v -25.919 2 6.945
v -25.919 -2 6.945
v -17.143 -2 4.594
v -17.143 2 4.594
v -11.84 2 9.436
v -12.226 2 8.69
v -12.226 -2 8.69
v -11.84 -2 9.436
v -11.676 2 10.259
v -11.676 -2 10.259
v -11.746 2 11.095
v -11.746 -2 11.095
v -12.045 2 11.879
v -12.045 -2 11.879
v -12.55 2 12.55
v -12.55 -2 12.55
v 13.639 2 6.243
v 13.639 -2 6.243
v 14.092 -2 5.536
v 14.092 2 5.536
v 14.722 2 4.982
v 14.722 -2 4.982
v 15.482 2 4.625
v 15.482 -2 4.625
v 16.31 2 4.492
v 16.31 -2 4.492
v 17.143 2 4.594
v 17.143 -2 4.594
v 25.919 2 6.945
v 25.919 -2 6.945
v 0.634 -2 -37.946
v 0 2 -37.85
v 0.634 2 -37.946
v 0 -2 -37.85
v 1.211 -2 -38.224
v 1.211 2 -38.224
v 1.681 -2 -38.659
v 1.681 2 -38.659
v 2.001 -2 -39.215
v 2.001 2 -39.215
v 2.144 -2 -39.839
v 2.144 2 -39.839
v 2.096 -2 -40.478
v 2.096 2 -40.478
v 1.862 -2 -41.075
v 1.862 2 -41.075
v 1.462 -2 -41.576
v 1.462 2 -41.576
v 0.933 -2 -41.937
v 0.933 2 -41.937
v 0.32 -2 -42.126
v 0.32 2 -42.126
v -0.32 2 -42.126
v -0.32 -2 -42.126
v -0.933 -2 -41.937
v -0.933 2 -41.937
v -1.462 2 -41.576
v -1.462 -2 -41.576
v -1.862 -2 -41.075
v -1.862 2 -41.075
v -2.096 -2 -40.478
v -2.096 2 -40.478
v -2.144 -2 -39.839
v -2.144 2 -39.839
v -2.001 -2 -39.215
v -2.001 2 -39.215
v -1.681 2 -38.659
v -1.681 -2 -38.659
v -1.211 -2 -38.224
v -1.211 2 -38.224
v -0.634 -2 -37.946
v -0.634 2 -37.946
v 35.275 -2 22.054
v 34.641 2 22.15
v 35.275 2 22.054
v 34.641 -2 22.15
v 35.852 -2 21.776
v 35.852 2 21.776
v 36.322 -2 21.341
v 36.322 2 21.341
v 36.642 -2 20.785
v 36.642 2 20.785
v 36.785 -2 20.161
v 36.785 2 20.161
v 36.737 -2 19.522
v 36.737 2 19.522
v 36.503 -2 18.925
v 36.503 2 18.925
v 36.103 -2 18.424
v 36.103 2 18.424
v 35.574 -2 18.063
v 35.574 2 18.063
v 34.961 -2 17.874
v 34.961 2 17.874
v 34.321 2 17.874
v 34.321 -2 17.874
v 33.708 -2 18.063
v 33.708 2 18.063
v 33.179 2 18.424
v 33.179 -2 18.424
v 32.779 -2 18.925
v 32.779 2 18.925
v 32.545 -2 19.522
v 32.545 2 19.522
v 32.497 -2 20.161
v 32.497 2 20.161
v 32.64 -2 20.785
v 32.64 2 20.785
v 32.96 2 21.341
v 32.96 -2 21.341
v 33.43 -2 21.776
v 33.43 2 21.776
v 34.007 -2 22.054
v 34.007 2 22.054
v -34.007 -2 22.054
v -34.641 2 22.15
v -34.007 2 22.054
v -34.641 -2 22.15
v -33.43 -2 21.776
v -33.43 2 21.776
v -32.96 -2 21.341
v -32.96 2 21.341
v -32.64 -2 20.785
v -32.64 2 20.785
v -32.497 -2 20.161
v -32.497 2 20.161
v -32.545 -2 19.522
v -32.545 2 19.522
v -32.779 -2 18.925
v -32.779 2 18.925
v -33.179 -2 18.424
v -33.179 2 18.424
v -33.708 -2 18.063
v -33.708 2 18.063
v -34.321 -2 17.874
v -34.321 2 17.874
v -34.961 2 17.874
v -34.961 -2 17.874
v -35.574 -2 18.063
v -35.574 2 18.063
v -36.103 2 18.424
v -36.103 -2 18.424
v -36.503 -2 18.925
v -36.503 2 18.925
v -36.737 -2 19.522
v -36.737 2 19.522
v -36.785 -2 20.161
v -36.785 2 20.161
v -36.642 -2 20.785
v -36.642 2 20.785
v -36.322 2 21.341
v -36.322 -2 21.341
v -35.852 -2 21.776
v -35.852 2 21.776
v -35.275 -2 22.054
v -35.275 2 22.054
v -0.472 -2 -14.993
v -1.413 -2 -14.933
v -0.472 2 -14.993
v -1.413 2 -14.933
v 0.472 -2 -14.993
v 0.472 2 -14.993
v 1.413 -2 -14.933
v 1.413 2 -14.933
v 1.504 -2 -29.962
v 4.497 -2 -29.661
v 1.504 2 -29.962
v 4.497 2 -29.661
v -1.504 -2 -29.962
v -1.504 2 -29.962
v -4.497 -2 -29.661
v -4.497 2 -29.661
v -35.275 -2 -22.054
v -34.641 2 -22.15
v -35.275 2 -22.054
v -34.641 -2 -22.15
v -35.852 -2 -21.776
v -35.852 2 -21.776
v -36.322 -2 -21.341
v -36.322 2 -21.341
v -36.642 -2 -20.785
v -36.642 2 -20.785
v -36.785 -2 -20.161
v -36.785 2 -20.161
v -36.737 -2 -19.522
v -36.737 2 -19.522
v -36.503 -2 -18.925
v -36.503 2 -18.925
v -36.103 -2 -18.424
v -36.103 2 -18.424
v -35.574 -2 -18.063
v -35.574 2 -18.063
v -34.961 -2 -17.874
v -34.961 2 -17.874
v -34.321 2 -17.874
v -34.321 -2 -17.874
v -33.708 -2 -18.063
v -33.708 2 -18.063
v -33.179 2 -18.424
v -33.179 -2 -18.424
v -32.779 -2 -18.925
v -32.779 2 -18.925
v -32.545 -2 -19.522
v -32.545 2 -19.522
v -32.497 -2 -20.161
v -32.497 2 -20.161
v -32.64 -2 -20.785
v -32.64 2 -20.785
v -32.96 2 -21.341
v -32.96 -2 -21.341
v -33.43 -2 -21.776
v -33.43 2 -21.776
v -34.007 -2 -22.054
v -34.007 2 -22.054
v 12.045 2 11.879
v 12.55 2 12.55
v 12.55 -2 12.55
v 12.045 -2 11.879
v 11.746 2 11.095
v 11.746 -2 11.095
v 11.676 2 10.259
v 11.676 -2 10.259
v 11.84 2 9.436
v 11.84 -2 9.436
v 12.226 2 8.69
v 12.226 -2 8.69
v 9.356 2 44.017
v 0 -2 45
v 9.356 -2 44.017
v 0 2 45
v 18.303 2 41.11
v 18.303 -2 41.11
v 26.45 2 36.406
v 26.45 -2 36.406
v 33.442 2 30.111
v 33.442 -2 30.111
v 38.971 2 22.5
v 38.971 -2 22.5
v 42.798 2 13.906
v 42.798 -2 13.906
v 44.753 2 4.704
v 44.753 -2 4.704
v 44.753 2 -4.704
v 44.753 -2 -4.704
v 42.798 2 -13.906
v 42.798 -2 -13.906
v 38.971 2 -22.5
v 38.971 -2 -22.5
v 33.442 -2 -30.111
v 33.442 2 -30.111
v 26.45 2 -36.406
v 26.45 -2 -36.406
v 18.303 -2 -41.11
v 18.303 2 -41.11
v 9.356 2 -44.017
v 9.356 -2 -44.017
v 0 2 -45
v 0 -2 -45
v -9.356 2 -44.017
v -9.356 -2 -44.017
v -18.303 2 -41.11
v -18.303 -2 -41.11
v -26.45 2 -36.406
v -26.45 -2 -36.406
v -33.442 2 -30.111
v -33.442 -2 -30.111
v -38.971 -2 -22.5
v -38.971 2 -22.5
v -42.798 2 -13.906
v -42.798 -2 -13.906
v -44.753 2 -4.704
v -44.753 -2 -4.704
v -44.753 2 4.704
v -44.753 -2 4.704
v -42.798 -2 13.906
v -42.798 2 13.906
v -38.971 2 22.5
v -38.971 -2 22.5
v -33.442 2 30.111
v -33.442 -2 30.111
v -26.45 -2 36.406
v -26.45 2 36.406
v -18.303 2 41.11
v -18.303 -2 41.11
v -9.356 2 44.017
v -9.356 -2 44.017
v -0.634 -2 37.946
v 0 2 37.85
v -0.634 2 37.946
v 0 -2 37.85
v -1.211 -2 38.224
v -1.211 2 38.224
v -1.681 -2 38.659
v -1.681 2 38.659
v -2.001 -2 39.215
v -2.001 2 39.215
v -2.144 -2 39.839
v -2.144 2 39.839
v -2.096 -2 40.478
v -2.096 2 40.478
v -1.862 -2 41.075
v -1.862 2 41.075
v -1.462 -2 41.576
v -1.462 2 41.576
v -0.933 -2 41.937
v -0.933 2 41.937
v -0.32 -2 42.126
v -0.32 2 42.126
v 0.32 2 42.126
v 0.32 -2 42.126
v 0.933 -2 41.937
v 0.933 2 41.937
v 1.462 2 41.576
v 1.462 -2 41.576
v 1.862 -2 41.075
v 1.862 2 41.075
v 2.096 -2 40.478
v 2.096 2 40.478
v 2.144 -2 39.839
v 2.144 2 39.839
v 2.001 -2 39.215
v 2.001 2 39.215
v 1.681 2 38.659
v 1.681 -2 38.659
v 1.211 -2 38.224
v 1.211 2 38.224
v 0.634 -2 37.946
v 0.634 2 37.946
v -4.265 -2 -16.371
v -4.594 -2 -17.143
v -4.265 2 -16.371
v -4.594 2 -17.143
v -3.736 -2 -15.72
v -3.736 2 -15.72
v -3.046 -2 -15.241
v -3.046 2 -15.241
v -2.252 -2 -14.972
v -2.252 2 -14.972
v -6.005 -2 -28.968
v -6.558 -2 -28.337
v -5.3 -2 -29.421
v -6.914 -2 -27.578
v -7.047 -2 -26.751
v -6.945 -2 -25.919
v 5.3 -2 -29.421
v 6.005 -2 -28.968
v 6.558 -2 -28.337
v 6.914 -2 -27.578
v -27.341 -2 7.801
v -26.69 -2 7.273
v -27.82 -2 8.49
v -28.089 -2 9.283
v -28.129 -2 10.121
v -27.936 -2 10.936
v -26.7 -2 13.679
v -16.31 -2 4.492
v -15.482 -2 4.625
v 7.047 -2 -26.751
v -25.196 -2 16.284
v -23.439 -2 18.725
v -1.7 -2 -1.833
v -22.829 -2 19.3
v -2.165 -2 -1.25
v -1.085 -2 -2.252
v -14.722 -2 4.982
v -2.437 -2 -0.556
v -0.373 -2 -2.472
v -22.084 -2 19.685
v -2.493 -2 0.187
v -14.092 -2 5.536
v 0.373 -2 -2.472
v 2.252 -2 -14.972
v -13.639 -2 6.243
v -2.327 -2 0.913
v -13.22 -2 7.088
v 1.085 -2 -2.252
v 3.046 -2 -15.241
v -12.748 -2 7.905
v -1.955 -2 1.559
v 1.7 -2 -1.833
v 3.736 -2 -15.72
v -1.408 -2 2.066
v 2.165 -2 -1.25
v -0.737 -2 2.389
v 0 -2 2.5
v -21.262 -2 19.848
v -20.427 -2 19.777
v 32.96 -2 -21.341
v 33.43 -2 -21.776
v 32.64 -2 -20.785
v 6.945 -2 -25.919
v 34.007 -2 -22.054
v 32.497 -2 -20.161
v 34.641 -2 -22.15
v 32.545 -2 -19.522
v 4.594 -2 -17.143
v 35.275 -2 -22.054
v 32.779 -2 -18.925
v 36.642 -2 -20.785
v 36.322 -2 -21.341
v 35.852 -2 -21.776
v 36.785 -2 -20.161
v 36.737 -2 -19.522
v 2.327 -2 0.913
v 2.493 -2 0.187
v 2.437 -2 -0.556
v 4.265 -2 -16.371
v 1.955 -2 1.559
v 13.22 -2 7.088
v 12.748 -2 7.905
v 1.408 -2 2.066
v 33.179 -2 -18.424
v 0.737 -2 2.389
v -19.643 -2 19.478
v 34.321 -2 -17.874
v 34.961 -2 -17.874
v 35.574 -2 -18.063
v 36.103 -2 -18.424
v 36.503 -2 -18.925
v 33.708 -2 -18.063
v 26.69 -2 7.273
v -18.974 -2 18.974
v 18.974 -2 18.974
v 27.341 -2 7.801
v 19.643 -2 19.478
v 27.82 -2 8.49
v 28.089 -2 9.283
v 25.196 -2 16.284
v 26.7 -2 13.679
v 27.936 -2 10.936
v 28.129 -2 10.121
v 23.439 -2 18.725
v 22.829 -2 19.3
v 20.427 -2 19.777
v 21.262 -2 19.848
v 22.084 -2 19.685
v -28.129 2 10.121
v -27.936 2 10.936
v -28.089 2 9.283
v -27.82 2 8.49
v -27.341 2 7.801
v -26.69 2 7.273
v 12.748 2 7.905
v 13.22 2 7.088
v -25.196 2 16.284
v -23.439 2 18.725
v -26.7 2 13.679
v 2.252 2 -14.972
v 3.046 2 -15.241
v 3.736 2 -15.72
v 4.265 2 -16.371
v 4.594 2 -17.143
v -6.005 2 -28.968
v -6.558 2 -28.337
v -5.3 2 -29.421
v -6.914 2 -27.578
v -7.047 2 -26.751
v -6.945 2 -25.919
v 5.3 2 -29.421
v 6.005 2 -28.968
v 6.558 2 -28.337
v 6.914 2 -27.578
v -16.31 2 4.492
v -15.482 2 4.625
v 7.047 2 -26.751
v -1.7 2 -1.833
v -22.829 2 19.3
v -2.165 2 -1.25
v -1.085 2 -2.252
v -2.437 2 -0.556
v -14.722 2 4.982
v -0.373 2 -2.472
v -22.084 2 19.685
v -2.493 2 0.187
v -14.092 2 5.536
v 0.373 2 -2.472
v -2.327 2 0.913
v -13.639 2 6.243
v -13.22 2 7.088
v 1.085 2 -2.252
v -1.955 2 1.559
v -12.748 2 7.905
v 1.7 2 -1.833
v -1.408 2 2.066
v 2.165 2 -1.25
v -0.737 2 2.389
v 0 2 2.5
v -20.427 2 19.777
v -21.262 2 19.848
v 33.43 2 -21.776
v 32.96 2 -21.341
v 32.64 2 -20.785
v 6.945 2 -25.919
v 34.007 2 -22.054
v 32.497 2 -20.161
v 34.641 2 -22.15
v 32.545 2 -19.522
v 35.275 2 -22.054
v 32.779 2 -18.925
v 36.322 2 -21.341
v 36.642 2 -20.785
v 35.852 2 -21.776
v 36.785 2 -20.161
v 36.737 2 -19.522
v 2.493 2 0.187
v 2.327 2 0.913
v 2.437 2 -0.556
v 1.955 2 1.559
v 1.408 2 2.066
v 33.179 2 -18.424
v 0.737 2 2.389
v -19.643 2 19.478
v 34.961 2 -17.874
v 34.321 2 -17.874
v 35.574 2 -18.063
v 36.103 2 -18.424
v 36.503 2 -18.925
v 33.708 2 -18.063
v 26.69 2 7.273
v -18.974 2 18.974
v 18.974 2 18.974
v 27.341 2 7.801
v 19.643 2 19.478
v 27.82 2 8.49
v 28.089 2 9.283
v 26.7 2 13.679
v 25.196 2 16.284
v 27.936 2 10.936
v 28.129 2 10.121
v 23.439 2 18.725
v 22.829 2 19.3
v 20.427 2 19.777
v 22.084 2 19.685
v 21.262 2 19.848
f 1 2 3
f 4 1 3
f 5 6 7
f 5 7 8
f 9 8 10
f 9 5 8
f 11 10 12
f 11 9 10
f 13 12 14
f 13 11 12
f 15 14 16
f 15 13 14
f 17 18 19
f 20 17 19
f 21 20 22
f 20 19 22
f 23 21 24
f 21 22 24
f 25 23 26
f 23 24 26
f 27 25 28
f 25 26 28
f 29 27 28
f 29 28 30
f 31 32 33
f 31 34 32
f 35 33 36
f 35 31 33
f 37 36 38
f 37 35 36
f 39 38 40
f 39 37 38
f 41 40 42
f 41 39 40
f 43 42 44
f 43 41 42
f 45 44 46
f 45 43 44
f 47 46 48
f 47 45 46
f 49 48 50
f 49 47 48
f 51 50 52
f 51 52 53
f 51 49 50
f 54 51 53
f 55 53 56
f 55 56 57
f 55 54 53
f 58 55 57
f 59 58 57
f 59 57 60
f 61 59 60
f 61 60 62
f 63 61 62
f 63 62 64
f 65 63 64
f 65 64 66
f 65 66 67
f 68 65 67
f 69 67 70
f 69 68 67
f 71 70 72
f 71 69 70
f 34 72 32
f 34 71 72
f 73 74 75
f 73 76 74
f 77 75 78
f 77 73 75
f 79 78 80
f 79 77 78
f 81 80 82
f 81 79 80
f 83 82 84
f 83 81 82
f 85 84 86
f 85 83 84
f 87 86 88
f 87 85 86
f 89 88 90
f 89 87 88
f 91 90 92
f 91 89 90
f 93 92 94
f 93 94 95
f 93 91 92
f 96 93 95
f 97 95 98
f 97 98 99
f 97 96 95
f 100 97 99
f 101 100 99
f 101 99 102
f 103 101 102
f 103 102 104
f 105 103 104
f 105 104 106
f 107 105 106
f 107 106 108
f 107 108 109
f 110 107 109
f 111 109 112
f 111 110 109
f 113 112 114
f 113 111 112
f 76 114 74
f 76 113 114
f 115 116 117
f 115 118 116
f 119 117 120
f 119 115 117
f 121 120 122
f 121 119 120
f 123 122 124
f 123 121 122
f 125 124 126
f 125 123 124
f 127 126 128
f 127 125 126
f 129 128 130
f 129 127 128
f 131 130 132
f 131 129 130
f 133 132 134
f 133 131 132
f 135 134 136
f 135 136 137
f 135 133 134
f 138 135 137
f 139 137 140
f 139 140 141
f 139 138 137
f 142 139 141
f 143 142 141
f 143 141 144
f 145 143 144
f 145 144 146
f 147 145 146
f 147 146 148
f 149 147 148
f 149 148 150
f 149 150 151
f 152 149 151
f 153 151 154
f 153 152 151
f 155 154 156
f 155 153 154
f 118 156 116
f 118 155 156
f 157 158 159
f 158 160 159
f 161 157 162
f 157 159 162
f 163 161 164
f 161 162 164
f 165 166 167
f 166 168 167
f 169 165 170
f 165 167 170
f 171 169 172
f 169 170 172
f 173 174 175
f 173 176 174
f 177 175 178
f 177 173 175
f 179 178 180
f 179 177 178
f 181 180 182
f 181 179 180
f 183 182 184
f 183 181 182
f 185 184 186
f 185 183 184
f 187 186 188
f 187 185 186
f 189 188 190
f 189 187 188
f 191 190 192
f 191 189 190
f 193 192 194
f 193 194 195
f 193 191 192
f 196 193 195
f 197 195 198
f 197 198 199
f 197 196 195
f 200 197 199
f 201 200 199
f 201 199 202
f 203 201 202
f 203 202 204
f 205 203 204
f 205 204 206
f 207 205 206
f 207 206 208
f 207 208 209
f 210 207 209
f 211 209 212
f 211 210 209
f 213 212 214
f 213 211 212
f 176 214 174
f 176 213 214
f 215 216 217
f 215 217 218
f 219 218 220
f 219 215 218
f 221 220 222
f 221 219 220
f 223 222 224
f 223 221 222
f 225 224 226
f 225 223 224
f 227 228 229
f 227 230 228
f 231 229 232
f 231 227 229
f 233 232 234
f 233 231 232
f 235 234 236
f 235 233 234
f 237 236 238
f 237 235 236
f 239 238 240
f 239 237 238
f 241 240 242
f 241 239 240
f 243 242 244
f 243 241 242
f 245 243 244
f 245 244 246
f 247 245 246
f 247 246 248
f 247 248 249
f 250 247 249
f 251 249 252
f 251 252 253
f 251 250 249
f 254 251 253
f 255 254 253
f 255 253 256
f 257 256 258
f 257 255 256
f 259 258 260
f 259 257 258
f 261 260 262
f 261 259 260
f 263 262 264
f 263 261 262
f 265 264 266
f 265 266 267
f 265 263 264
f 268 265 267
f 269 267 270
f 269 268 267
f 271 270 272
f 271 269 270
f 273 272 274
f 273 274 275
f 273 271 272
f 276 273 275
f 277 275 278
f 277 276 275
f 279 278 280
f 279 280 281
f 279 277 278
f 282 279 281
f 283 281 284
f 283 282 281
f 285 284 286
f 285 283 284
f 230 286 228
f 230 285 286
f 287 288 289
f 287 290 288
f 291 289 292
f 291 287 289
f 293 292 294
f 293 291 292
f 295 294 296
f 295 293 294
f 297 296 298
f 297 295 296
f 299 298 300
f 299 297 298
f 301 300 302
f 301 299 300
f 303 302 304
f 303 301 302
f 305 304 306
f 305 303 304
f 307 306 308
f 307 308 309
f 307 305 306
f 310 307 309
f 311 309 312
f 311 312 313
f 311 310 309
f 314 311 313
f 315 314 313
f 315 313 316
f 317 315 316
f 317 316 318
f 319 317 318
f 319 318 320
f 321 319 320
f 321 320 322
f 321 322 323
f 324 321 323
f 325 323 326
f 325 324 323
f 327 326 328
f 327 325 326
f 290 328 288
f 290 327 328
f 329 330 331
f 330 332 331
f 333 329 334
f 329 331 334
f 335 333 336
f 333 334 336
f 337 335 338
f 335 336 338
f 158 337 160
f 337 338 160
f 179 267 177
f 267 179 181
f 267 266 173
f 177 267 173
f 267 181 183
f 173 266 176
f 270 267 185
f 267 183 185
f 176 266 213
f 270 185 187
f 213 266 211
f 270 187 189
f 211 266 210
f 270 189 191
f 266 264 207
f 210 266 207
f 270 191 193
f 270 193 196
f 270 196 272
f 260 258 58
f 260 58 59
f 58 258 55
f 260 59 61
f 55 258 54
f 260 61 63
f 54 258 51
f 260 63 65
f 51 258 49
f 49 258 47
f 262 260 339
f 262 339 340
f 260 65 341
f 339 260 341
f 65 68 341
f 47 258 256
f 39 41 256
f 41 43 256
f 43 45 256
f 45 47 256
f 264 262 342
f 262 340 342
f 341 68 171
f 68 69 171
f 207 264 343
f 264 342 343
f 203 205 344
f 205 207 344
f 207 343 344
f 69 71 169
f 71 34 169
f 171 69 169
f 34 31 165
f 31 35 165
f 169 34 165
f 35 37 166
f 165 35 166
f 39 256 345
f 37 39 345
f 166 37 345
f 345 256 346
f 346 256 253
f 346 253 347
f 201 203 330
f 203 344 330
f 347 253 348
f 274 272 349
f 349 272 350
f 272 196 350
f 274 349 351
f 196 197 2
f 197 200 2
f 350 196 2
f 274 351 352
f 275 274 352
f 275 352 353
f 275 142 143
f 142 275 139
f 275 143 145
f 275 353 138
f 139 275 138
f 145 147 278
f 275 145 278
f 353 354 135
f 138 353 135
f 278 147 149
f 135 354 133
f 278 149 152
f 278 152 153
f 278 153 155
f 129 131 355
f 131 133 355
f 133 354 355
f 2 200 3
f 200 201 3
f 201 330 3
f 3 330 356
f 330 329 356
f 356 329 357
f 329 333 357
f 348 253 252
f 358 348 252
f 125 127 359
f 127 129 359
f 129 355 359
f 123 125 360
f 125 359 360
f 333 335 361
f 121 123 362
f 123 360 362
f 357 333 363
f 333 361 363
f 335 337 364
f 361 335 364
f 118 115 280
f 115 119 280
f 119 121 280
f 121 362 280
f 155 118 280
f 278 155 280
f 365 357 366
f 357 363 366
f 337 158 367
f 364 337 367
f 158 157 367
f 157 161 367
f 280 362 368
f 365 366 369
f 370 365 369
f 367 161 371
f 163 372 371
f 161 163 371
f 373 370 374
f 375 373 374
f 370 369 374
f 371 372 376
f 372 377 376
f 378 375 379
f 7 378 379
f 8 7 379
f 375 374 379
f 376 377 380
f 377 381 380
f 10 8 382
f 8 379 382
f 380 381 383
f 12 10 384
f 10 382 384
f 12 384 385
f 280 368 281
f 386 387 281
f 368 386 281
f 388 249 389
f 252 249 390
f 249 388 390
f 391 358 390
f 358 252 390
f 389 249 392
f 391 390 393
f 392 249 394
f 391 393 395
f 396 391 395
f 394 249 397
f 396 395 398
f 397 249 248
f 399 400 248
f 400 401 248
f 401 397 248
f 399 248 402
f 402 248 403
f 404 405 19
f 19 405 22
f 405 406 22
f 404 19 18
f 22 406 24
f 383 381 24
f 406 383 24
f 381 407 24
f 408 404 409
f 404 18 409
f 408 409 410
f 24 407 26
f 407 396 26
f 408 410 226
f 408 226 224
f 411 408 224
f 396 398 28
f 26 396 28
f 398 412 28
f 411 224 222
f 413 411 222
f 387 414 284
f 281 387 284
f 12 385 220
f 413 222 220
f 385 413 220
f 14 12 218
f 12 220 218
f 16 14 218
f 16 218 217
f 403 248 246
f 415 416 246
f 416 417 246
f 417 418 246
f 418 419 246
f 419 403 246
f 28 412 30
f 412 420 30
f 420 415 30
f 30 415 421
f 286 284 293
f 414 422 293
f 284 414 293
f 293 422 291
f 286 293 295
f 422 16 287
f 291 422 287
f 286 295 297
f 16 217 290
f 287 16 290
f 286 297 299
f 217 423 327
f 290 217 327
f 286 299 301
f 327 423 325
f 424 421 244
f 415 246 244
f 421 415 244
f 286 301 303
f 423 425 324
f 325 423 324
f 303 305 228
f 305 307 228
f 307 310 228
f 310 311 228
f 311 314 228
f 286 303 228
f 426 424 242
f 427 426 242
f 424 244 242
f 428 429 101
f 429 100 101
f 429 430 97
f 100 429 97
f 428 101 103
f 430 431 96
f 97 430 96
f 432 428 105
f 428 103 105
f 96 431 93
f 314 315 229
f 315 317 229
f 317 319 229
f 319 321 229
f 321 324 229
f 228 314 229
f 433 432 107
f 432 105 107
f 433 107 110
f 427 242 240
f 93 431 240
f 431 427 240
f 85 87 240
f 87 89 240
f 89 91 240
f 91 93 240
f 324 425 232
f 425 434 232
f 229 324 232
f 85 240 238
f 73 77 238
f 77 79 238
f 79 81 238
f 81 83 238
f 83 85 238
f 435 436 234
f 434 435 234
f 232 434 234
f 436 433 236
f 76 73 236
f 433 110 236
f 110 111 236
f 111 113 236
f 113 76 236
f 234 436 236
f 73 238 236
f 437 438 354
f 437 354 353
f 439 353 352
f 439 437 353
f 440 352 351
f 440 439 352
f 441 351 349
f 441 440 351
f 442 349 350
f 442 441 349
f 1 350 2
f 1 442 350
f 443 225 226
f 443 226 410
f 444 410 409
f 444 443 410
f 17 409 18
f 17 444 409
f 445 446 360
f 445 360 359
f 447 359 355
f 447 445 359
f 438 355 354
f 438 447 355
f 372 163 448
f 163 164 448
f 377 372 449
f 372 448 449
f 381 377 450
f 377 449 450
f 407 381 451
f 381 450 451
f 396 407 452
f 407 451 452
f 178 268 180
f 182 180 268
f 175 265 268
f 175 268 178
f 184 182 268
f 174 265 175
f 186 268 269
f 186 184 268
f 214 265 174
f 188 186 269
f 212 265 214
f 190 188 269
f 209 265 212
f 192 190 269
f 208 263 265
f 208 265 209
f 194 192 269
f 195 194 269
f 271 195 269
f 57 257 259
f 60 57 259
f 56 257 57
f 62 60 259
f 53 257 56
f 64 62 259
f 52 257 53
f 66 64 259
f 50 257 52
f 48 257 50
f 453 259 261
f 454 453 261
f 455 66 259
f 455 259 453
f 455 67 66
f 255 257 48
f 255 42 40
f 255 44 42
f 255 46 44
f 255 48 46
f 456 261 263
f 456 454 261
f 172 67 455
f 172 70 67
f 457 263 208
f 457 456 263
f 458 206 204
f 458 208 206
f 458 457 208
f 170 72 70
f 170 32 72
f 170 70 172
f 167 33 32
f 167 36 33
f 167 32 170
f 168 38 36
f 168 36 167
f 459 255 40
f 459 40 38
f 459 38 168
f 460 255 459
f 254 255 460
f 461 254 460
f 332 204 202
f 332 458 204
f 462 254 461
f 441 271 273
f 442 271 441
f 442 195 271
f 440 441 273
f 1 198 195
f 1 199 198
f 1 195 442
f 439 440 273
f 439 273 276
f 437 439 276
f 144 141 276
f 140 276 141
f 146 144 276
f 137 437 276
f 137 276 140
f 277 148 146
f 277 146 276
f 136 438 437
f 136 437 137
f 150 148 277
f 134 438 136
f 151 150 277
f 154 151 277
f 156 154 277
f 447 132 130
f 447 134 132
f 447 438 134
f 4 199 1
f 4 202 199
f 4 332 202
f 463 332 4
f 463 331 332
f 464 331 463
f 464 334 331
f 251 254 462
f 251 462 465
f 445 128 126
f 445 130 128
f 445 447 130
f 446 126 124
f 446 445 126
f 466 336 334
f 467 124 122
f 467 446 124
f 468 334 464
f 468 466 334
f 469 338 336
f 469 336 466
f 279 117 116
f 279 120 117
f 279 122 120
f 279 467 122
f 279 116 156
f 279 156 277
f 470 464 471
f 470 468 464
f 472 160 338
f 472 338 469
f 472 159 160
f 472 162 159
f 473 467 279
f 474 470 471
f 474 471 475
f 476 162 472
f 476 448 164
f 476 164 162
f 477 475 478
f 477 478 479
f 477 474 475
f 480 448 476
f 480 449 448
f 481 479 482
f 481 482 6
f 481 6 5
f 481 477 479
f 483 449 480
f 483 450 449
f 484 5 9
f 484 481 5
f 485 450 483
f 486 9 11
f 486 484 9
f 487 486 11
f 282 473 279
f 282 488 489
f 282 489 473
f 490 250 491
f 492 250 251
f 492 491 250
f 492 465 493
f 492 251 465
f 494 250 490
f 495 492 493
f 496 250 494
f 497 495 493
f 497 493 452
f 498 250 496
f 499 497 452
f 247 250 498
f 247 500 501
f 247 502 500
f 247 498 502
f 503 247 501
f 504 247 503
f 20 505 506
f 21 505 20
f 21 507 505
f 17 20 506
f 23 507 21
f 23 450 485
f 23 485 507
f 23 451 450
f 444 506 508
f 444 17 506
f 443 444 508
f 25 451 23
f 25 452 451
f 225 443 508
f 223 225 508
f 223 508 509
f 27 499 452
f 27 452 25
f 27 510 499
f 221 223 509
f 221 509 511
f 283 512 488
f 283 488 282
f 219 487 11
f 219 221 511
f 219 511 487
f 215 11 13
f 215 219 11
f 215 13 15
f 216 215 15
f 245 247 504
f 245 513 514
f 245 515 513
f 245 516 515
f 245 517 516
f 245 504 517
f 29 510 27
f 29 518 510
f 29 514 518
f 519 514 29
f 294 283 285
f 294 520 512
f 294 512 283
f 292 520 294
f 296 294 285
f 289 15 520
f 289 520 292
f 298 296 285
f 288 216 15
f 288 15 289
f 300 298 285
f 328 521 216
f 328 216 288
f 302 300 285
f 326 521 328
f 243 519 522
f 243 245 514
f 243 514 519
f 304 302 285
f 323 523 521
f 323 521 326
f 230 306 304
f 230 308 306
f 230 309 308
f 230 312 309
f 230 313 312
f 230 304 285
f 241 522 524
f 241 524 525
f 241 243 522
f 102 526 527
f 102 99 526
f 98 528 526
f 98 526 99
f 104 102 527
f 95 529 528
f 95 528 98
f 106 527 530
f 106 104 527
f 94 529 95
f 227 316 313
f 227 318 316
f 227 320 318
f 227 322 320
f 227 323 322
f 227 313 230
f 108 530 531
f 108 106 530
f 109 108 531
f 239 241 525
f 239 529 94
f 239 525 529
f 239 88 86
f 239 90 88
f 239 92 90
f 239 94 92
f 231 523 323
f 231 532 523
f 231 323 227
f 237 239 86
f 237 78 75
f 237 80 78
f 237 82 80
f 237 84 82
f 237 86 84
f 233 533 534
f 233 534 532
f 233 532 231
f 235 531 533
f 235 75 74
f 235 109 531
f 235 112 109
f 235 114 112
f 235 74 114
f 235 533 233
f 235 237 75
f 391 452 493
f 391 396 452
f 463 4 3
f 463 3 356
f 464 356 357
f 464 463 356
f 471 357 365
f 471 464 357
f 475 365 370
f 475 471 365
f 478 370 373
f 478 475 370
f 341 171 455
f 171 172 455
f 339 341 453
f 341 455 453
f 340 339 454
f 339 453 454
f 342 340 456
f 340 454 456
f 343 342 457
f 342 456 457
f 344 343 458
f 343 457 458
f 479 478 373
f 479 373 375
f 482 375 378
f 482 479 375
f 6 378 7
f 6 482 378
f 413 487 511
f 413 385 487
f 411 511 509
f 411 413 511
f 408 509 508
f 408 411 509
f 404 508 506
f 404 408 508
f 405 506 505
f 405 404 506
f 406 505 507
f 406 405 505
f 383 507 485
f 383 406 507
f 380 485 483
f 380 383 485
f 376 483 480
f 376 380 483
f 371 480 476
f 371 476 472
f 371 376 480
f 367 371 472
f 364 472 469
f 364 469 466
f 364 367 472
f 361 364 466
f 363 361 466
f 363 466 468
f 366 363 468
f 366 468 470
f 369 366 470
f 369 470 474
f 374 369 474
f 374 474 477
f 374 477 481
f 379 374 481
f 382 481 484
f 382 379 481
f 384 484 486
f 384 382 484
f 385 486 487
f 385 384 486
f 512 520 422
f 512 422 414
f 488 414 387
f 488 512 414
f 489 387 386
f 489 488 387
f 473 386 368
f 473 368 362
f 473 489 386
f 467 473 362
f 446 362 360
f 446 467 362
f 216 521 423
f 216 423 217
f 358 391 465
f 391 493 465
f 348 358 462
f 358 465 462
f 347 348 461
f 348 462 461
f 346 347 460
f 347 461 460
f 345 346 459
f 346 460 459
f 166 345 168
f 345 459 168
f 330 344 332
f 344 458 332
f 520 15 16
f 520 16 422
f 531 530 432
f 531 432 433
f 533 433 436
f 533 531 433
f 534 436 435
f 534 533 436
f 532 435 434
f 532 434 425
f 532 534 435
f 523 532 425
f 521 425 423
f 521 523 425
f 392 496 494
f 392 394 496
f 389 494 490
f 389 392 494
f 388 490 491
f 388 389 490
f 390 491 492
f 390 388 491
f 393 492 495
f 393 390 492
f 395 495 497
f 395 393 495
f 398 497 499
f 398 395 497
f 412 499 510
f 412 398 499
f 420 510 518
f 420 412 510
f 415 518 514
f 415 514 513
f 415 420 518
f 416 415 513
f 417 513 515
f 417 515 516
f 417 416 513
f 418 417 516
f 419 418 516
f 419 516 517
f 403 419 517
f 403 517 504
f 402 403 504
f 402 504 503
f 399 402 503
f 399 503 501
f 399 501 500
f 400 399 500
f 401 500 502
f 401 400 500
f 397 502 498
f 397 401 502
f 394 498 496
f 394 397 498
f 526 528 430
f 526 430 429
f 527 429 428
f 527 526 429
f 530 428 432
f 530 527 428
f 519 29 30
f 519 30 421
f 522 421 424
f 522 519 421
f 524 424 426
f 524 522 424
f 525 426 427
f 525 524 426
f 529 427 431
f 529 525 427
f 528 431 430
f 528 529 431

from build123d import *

# Parameters (mm, degrees)
SKETCH_1_R      = 45
SKETCH_1_R_2    = 2.15
SKETCH_1_R_3    = 2.5
EXTRUDE_1_DEPTH = 2


with BuildPart() as part:
    # Эскиз1 → Бобышка-Вытянуть1 (new, symmetric)
    with BuildSketch(Plane(origin=(0, 0, 0), x_dir=(1, 0, 0), z_dir=(0, 1, 0))):
        with Locations(Location((0, 0, 0), (0, 0, 270))):
            Circle(SKETCH_1_R)
        with Locations(Location((0, 40, 0), (0, 0, 270))):
            Circle(SKETCH_1_R_2, mode=Mode.SUBTRACT)
        with Locations(Location((0, -40, 0), (0, 0, 90))):
            Circle(SKETCH_1_R_2, mode=Mode.SUBTRACT)
        with Locations(Location((34.641016151, -20, 0), (0, 0, 270))):
            Circle(SKETCH_1_R_2, mode=Mode.SUBTRACT)
        with Locations(Location((-34.641016151, 20, 0), (0, 0, 90))):
            Circle(SKETCH_1_R_2, mode=Mode.SUBTRACT)
        with Locations(Location((-34.641016151, -20, 0), (0, 0, 270))):
            Circle(SKETCH_1_R_2, mode=Mode.SUBTRACT)
        with Locations(Location((34.641016151, 20, 0), (0, 0, 90))):
            Circle(SKETCH_1_R_2, mode=Mode.SUBTRACT)
        with Locations(Location((0, 0, 0), (0, 0, 270))):
            Circle(SKETCH_1_R_3, mode=Mode.SUBTRACT)
        with BuildLine():
            Line((-6.944843745, 25.918509706), (-4.593582361, 17.143482759))
            ThreePointArc((-4.593582361, 17.143482759), (-3.407818063, 15.456403642), (-1.413170735, 14.933283245))
            ThreePointArc((-1.413170735, 14.933283245), (0, 15), (1.413170735, 14.933283245))
            ThreePointArc((1.413170735, 14.933283245), (3.407818063, 15.456403642), (4.593582361, 17.143482759))
            Line((4.593582361, 17.143482759), (6.944843745, 25.918509706))
            ThreePointArc((6.944843745, 25.918509706), (6.557654897, 28.33720456), (4.496740295, 29.661074268))
            ThreePointArc((4.496740295, 29.661074268), (0, 30), (-4.496740295, 29.661074268))
            ThreePointArc((-4.496740295, 29.661074268), (-6.557654897, 28.33720456), (-6.944843745, 25.918509706))
        make_face(mode=Mode.SUBTRACT)
        with BuildLine():
            Line((18.973665961, -18.973665961), (12.549900398, -12.549900398))
            ThreePointArc((12.549900398, -12.549900398), (11.681729173, -10.679458835), (12.226017285, -8.690483379))
            ThreePointArc((12.226017285, -8.690483379), (12.990381057, -7.5), (13.639188019, -6.242799866))
            ThreePointArc((13.639188019, -6.242799866), (15.089547237, -4.776944806), (17.143482759, -4.593582361))
            Line((17.143482759, -4.593582361), (25.918509706, -6.944843745))
            ThreePointArc((25.918509706, -6.944843745), (27.819566469, -8.48950655), (27.935613967, -10.936245804))
            ThreePointArc((27.935613967, -10.936245804), (25.980762114, -15), (23.438873672, -18.724828464))
            ThreePointArc((23.438873672, -18.724828464), (21.261911572, -19.84769801), (18.973665961, -18.973665961))
        make_face(mode=Mode.SUBTRACT)
        with BuildLine():
            Line((-25.918509706, -6.944843745), (-17.143482759, -4.593582361))
            ThreePointArc((-17.143482759, -4.593582361), (-15.089547237, -4.776944806), (-13.639188019, -6.242799866))
            ThreePointArc((-13.639188019, -6.242799866), (-12.990381057, -7.5), (-12.226017285, -8.690483379))
            ThreePointArc((-12.226017285, -8.690483379), (-11.681729173, -10.679458835), (-12.549900398, -12.549900398))
            Line((-12.549900398, -12.549900398), (-18.973665961, -18.973665961))
            ThreePointArc((-18.973665961, -18.973665961), (-21.261911572, -19.84769801), (-23.438873672, -18.724828464))
            ThreePointArc((-23.438873672, -18.724828464), (-25.980762114, -15), (-27.935613967, -10.936245804))
            ThreePointArc((-27.935613967, -10.936245804), (-27.819566469, -8.48950655), (-25.918509706, -6.944843745))
        make_face(mode=Mode.SUBTRACT)
    extrude(amount=EXTRUDE_1_DEPTH, both=True)


solid = part.part
